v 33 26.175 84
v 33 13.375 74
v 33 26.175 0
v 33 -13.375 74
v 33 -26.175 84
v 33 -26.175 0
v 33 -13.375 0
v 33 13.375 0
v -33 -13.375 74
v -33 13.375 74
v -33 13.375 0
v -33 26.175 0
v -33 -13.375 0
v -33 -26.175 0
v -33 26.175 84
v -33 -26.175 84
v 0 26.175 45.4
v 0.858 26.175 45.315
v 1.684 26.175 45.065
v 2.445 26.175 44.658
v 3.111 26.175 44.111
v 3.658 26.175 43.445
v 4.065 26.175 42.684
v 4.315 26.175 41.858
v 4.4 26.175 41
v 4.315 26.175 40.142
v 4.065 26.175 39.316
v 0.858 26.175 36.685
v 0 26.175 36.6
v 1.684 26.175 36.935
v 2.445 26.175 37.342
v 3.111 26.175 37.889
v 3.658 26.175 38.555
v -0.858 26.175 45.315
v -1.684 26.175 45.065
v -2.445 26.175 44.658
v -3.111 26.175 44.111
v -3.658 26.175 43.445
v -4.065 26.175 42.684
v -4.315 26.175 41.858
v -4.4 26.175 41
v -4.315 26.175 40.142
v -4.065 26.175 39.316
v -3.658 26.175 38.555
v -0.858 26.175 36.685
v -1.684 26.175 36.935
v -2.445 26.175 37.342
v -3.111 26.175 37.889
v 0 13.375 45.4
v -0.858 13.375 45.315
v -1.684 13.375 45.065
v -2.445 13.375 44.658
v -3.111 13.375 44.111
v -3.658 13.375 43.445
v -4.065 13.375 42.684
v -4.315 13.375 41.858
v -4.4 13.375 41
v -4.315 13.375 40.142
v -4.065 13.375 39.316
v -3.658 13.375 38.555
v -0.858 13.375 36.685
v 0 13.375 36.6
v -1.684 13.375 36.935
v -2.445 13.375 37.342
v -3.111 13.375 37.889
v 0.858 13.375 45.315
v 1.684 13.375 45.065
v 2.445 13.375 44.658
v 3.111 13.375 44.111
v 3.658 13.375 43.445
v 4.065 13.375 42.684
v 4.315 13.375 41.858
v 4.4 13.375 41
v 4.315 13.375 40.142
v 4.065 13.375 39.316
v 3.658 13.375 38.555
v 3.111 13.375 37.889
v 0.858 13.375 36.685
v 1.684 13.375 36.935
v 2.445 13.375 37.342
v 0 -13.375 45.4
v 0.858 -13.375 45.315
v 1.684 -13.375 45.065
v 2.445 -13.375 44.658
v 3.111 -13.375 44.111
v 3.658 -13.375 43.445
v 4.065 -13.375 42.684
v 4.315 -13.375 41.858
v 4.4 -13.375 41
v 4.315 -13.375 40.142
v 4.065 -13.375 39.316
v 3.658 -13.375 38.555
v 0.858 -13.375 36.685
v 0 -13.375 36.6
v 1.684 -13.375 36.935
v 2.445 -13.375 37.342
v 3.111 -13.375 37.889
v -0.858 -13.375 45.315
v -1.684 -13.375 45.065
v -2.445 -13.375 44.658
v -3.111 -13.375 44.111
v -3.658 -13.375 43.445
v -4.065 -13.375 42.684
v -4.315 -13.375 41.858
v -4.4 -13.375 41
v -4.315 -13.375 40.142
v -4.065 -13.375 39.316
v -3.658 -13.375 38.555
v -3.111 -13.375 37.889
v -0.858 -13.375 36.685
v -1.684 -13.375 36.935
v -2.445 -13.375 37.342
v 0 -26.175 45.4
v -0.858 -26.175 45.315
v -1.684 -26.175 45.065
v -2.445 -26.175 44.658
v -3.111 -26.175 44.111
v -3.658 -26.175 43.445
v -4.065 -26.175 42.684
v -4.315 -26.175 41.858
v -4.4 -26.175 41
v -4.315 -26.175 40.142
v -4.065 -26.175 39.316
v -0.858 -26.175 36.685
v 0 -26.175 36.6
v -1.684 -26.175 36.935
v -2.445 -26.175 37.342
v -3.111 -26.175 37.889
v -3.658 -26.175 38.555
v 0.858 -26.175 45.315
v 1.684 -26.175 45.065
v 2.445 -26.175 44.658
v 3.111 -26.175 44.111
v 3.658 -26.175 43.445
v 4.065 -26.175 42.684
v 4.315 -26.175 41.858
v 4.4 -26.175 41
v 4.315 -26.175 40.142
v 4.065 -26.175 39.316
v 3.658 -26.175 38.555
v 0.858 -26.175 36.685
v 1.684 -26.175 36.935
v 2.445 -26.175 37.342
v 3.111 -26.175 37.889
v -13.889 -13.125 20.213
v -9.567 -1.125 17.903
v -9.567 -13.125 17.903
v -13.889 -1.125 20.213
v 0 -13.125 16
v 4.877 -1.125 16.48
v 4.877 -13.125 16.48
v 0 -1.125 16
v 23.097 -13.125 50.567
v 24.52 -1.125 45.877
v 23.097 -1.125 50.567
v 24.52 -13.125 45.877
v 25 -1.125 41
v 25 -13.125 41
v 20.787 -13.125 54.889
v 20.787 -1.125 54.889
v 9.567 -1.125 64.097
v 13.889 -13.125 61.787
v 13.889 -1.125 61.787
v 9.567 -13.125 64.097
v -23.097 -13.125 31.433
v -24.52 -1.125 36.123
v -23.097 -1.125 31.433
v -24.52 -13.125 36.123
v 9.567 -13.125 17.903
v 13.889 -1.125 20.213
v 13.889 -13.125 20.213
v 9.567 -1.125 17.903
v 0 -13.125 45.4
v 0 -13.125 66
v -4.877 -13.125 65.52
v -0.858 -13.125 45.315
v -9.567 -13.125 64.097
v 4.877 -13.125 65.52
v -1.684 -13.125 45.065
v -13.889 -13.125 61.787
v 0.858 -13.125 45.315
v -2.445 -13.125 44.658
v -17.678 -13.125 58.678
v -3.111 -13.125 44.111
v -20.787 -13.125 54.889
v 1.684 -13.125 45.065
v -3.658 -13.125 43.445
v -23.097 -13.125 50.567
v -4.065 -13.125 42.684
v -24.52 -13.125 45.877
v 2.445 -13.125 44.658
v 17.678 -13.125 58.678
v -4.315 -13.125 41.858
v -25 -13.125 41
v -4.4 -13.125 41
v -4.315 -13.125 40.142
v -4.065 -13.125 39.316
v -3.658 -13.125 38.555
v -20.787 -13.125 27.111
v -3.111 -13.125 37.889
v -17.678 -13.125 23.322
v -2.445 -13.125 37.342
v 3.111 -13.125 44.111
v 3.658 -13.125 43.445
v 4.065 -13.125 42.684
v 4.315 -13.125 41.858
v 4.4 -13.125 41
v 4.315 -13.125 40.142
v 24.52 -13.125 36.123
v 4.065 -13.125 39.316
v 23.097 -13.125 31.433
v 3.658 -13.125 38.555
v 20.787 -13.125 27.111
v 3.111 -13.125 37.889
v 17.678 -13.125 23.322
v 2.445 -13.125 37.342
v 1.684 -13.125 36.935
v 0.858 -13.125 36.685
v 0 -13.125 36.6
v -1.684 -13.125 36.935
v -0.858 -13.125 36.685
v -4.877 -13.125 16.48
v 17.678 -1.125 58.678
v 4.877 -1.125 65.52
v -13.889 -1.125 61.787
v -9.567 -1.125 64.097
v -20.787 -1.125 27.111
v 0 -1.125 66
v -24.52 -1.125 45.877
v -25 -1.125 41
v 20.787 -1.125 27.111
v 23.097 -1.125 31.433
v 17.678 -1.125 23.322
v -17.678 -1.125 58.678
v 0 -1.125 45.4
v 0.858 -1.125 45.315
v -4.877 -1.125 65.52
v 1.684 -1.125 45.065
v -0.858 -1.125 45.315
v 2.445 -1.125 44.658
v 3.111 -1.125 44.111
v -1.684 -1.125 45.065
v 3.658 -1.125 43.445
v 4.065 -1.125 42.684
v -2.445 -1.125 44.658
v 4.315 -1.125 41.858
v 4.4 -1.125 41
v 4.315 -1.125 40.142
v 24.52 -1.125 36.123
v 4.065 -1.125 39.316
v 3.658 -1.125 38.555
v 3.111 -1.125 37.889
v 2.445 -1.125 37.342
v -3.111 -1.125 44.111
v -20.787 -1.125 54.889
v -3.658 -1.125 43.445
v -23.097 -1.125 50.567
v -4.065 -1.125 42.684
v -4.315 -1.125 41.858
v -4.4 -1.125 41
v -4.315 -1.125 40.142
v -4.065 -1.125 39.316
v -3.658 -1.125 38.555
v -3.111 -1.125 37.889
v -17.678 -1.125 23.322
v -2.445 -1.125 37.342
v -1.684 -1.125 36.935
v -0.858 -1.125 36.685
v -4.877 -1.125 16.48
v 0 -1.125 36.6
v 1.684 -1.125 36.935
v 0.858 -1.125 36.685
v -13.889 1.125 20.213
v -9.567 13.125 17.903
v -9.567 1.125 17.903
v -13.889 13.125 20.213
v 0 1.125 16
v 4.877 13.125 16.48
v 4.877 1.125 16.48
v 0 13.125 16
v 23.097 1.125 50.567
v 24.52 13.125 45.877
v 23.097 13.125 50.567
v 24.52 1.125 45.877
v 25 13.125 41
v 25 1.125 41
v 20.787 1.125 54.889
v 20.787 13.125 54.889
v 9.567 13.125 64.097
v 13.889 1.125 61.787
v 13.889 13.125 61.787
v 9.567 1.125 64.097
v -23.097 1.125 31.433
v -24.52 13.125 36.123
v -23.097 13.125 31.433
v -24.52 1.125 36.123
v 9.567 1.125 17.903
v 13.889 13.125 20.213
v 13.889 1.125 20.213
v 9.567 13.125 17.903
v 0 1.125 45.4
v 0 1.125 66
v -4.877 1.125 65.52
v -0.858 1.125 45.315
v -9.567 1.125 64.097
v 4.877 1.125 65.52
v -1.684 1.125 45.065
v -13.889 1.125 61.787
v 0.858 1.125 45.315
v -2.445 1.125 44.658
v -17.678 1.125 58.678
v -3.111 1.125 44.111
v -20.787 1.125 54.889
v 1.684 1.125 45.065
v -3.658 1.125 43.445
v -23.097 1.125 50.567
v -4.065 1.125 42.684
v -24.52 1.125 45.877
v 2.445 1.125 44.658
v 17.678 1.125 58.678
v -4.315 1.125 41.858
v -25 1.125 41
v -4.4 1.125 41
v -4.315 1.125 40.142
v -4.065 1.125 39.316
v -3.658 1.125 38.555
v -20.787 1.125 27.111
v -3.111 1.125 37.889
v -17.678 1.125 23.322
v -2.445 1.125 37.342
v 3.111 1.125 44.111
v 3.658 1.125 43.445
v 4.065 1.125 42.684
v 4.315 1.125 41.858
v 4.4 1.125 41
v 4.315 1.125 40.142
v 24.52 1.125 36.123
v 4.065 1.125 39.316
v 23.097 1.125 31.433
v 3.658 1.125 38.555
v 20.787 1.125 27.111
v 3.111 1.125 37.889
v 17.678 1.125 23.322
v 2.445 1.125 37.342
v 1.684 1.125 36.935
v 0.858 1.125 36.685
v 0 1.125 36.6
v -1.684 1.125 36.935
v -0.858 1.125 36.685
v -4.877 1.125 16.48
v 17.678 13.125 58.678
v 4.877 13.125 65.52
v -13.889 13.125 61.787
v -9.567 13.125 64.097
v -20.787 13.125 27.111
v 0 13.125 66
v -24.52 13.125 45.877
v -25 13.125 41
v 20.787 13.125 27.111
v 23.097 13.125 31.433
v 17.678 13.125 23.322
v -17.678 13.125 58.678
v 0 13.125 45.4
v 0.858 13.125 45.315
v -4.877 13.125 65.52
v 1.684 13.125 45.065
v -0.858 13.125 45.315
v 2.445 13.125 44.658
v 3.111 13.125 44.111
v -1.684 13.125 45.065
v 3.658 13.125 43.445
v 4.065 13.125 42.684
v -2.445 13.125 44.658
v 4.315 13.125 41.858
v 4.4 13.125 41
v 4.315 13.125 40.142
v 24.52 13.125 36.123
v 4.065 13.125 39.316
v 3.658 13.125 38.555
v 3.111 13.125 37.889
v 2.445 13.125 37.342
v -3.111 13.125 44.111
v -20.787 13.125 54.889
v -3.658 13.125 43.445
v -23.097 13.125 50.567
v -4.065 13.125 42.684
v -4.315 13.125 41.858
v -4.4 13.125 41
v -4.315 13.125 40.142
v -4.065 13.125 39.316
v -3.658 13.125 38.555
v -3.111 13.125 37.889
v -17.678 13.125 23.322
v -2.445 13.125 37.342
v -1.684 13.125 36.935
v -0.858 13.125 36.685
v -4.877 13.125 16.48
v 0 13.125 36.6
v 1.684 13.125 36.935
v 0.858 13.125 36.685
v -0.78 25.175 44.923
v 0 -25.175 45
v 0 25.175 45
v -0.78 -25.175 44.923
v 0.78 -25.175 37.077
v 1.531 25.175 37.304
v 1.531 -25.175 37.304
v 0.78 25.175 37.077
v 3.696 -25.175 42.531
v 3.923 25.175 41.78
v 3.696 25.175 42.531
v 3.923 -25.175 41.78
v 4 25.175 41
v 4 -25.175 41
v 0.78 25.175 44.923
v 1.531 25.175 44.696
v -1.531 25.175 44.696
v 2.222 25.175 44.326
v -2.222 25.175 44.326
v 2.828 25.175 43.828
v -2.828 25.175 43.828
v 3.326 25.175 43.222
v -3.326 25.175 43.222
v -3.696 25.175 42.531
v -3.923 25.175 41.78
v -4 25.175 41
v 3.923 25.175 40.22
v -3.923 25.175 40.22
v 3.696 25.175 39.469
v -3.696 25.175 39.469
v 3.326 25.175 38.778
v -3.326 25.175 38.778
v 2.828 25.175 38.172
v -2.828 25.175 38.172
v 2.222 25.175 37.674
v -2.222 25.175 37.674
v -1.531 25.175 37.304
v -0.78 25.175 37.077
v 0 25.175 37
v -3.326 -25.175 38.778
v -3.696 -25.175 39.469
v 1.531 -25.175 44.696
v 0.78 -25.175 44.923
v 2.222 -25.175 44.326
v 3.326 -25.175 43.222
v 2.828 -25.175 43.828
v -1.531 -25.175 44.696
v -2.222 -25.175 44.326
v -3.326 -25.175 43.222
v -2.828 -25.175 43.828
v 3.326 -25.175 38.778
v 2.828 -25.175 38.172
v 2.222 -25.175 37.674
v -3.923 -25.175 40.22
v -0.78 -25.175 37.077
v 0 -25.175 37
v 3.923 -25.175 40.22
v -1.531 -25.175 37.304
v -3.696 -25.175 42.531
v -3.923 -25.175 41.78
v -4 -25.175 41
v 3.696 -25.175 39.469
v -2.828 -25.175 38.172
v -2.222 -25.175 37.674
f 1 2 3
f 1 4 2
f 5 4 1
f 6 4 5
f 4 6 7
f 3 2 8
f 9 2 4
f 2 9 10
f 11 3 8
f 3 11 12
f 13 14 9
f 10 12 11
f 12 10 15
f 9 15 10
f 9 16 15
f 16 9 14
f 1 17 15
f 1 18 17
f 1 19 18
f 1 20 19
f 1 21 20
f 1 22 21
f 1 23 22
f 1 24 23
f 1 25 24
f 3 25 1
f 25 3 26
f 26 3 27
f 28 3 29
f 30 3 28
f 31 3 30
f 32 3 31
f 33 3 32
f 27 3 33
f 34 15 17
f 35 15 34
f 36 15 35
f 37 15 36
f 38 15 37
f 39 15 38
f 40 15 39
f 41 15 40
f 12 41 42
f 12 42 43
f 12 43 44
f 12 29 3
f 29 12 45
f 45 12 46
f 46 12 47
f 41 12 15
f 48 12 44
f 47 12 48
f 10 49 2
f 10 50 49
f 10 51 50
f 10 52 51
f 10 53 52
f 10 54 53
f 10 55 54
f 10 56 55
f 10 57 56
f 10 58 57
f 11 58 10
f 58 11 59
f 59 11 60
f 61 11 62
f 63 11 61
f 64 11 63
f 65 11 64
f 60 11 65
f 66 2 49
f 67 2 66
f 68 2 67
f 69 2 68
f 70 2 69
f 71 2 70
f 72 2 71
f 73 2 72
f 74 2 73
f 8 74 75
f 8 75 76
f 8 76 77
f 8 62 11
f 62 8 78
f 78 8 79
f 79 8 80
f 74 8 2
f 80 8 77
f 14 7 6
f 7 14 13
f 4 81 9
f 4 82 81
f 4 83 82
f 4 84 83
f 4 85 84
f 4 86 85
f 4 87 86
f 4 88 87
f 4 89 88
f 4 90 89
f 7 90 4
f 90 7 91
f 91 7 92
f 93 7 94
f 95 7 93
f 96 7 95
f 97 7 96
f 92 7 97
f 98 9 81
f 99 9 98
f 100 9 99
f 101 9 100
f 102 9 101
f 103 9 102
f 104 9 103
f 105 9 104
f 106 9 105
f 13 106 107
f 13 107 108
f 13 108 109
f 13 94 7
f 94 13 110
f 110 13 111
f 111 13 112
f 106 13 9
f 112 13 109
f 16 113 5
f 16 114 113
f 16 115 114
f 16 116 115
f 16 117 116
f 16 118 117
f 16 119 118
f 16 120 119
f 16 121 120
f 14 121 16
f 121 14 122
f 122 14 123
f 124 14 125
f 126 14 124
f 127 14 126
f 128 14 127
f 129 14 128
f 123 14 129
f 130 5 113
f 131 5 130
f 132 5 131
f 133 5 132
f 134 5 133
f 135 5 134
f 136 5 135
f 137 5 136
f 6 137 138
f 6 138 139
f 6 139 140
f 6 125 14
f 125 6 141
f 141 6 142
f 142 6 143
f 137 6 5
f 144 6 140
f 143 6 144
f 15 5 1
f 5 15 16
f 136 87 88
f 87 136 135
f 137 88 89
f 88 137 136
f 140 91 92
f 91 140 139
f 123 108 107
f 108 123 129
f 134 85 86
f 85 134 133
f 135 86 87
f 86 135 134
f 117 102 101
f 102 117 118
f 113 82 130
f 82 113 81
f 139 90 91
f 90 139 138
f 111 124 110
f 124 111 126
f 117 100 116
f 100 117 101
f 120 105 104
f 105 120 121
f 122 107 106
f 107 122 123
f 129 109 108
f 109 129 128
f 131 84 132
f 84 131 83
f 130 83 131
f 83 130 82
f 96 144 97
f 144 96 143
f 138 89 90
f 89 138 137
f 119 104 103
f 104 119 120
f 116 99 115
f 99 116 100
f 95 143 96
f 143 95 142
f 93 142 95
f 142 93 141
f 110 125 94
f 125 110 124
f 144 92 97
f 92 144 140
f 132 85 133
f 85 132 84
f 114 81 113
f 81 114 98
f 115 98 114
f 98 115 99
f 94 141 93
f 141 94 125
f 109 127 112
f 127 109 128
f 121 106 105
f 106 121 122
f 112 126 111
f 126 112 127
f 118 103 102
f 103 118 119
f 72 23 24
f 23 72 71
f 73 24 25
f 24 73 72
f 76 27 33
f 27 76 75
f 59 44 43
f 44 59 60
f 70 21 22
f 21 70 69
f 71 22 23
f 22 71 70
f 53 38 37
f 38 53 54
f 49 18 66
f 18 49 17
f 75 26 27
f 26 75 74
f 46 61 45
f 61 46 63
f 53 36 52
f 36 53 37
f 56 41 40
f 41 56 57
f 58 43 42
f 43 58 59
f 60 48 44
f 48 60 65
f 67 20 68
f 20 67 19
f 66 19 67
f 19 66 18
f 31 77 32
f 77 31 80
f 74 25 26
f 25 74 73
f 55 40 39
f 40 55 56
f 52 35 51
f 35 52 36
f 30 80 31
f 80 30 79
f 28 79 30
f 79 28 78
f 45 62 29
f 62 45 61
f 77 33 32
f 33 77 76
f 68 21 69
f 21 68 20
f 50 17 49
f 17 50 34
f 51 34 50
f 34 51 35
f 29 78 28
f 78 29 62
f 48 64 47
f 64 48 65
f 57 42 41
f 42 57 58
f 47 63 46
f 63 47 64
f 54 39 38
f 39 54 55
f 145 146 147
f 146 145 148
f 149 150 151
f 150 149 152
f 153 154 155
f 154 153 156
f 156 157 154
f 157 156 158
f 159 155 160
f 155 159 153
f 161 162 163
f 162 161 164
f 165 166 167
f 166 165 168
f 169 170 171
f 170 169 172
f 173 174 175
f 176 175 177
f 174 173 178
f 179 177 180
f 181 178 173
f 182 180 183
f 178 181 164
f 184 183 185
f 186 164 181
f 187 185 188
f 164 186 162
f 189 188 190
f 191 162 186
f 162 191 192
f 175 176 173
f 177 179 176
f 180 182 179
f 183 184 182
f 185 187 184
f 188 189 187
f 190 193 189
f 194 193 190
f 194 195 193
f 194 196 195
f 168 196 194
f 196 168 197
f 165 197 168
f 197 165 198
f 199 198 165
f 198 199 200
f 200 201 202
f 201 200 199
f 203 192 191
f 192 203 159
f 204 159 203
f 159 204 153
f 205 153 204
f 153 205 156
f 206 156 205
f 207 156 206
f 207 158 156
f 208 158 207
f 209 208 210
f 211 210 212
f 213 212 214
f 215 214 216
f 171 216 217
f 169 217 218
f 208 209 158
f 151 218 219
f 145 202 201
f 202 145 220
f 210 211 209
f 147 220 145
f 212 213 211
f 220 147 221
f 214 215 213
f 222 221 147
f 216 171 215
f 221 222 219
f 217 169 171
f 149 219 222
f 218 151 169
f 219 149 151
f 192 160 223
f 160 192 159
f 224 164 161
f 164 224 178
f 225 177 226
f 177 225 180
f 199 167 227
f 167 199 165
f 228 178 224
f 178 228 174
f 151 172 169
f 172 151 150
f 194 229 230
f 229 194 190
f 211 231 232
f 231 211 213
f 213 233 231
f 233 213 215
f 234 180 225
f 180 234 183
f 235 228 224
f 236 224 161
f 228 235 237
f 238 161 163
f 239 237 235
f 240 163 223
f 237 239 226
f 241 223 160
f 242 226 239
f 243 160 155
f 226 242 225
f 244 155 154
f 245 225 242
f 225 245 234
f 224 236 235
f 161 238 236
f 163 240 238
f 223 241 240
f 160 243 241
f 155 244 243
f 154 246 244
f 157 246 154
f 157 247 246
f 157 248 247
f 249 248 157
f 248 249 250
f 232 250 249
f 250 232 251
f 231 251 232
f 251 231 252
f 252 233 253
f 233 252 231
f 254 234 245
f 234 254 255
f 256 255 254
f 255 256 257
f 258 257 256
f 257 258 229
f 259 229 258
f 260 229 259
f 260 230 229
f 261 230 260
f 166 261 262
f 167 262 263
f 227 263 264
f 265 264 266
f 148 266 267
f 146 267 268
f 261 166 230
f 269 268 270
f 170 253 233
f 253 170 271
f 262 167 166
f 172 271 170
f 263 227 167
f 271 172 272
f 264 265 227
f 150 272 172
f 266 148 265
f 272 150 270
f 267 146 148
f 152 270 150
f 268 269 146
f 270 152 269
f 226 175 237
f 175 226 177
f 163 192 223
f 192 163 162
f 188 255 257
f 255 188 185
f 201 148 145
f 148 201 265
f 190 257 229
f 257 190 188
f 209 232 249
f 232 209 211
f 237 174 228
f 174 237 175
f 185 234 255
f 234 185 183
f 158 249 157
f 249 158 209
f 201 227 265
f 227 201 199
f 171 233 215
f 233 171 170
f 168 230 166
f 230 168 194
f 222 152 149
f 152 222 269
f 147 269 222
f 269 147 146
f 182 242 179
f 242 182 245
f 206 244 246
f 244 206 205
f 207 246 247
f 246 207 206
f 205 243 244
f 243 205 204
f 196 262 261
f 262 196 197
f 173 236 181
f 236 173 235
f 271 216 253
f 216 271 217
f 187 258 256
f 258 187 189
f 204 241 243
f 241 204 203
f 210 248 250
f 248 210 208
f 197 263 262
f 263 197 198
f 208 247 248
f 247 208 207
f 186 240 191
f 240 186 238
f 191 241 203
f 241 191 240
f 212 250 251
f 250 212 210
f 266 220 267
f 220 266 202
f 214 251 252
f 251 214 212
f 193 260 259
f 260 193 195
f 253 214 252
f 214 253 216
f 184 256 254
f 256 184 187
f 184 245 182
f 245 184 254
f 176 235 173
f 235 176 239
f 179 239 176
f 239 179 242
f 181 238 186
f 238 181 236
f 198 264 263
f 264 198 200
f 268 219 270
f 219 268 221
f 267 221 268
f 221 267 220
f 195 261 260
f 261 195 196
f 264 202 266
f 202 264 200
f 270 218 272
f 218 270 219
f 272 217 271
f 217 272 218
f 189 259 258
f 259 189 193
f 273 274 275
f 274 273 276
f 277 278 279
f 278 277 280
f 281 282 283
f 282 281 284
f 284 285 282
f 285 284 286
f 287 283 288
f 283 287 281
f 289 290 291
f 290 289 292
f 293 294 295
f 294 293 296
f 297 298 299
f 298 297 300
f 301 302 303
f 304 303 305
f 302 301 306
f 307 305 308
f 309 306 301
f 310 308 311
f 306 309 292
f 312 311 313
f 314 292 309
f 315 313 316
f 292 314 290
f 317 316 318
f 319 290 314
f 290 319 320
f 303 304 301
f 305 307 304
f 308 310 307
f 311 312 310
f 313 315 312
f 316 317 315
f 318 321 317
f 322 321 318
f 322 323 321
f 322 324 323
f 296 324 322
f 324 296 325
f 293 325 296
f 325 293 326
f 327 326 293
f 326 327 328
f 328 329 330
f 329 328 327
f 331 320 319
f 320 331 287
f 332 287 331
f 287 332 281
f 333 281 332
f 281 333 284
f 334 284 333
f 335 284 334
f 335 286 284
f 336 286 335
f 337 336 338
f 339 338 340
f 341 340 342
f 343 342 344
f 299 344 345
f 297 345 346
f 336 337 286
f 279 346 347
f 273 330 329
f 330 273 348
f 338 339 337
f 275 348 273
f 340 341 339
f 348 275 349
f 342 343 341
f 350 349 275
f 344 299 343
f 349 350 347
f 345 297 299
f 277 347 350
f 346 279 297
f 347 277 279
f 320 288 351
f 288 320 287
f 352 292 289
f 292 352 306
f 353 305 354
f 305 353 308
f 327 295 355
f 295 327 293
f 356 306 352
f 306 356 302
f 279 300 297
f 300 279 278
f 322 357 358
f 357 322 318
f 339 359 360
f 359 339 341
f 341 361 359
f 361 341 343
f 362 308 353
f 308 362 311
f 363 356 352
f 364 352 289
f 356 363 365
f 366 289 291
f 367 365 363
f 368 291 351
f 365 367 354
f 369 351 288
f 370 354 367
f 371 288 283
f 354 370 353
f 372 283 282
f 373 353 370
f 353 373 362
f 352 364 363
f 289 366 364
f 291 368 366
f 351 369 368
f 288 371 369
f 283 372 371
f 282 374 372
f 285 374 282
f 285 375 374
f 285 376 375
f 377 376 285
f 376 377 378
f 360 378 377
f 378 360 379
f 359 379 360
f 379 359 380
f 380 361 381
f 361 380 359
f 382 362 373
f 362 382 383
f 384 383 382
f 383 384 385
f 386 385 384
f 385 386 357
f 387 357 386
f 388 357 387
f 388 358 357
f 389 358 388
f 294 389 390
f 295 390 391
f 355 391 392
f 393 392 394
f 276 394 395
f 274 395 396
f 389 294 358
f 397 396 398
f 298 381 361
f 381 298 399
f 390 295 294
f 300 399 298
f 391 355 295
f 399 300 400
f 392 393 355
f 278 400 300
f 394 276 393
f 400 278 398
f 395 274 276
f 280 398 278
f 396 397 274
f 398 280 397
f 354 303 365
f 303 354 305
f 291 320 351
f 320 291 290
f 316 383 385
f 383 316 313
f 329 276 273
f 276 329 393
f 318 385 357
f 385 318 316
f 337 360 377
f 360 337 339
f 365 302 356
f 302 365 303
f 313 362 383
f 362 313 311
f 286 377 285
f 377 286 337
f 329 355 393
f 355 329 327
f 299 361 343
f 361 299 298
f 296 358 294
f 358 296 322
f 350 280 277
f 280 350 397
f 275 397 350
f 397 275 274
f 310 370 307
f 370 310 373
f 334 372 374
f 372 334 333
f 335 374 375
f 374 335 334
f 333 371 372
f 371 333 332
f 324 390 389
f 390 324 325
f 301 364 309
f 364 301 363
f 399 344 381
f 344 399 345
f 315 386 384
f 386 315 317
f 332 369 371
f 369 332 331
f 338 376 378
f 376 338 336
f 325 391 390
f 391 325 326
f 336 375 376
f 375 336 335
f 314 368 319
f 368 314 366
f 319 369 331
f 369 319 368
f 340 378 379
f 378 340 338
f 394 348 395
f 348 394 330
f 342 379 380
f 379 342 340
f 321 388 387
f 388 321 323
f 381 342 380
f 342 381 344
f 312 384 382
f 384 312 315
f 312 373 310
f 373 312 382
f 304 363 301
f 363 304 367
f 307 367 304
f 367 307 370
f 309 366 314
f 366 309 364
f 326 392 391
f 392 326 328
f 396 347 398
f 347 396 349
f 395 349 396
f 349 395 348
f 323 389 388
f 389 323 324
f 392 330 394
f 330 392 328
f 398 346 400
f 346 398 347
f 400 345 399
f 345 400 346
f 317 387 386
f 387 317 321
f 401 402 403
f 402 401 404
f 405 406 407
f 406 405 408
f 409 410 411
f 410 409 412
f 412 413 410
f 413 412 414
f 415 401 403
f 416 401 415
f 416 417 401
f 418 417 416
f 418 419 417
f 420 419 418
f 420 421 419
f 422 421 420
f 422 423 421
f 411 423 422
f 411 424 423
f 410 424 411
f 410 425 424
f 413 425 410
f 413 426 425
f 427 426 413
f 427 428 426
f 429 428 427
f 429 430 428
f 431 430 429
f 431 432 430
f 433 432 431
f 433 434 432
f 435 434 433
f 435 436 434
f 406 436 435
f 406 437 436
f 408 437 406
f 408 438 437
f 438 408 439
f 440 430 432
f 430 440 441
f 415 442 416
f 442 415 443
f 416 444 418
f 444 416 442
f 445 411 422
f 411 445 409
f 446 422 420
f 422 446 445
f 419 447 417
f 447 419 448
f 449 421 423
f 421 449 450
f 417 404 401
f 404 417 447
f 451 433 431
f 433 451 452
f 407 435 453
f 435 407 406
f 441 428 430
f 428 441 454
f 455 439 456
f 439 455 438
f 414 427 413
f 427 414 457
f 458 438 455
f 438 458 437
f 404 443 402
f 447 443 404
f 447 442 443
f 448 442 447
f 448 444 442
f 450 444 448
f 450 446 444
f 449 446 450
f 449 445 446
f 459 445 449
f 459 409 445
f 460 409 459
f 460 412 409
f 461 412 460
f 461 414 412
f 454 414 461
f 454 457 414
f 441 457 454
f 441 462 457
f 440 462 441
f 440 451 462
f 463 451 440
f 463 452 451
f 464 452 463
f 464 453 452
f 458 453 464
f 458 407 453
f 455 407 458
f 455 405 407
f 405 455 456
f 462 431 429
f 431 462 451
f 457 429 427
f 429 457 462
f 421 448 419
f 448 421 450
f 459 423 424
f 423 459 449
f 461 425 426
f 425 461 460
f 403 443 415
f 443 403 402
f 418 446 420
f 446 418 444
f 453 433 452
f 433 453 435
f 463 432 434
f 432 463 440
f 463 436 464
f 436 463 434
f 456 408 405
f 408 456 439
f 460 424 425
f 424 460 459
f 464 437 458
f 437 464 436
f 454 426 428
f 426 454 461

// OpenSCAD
$fn = 32;

// ------------------------------------------------------------------------
// Trolley wheel set: wheels d50, fork 74 mm tall
// Every part is its own module, assembly() places every instance.
// ------------------------------------------------------------------------

// --- part 1 ---
module trolley_fork() {
  difference() {
    union() {
      translate([-33, 13.375, 0]) cube([66, 12.8, 74]);
      translate([-33, -26.175, 0]) cube([66, 12.8, 74]);
      translate([-33, -26.175, 74]) cube([66, 52.35, 10]);
    }
    translate([0, -19.775, 41]) rotate([90, 0, 0]) cylinder(h = 14.8, d = 8.8, center = true);
    translate([0, 19.775, 41]) rotate([90, 0, 0]) cylinder(h = 14.8, d = 8.8, center = true);
  }
}

// --- part 2 ---
module trolley_wheel() {
  difference() {
      translate([0, 0, 0]) cylinder(h = 12, d = 50);
      translate([0, 0, -1]) cylinder(h = 14, d = 8.8);
    }
}

// --- part 3 ---
module trolley_axle() {
  translate([0, 0, -25.175]) cylinder(h = 50.35, d = 8);
}

// --- assembly ---
module assembly() {
  color([0.80, 0.24, 0.20]) translate([0, 0, 0]) rotate([0, 0, 0]) trolley_fork();
  color([0.20, 0.45, 0.75]) translate([0, -1.125, 41]) rotate([90, 0, 0]) trolley_wheel();
  color([0.25, 0.62, 0.32]) translate([0, 13.125, 41]) rotate([90, 0, 0]) trolley_wheel();
  color([0.92, 0.70, 0.18]) translate([0, 0, 41]) rotate([90, 0, 0]) trolley_axle();
}

assembly();
